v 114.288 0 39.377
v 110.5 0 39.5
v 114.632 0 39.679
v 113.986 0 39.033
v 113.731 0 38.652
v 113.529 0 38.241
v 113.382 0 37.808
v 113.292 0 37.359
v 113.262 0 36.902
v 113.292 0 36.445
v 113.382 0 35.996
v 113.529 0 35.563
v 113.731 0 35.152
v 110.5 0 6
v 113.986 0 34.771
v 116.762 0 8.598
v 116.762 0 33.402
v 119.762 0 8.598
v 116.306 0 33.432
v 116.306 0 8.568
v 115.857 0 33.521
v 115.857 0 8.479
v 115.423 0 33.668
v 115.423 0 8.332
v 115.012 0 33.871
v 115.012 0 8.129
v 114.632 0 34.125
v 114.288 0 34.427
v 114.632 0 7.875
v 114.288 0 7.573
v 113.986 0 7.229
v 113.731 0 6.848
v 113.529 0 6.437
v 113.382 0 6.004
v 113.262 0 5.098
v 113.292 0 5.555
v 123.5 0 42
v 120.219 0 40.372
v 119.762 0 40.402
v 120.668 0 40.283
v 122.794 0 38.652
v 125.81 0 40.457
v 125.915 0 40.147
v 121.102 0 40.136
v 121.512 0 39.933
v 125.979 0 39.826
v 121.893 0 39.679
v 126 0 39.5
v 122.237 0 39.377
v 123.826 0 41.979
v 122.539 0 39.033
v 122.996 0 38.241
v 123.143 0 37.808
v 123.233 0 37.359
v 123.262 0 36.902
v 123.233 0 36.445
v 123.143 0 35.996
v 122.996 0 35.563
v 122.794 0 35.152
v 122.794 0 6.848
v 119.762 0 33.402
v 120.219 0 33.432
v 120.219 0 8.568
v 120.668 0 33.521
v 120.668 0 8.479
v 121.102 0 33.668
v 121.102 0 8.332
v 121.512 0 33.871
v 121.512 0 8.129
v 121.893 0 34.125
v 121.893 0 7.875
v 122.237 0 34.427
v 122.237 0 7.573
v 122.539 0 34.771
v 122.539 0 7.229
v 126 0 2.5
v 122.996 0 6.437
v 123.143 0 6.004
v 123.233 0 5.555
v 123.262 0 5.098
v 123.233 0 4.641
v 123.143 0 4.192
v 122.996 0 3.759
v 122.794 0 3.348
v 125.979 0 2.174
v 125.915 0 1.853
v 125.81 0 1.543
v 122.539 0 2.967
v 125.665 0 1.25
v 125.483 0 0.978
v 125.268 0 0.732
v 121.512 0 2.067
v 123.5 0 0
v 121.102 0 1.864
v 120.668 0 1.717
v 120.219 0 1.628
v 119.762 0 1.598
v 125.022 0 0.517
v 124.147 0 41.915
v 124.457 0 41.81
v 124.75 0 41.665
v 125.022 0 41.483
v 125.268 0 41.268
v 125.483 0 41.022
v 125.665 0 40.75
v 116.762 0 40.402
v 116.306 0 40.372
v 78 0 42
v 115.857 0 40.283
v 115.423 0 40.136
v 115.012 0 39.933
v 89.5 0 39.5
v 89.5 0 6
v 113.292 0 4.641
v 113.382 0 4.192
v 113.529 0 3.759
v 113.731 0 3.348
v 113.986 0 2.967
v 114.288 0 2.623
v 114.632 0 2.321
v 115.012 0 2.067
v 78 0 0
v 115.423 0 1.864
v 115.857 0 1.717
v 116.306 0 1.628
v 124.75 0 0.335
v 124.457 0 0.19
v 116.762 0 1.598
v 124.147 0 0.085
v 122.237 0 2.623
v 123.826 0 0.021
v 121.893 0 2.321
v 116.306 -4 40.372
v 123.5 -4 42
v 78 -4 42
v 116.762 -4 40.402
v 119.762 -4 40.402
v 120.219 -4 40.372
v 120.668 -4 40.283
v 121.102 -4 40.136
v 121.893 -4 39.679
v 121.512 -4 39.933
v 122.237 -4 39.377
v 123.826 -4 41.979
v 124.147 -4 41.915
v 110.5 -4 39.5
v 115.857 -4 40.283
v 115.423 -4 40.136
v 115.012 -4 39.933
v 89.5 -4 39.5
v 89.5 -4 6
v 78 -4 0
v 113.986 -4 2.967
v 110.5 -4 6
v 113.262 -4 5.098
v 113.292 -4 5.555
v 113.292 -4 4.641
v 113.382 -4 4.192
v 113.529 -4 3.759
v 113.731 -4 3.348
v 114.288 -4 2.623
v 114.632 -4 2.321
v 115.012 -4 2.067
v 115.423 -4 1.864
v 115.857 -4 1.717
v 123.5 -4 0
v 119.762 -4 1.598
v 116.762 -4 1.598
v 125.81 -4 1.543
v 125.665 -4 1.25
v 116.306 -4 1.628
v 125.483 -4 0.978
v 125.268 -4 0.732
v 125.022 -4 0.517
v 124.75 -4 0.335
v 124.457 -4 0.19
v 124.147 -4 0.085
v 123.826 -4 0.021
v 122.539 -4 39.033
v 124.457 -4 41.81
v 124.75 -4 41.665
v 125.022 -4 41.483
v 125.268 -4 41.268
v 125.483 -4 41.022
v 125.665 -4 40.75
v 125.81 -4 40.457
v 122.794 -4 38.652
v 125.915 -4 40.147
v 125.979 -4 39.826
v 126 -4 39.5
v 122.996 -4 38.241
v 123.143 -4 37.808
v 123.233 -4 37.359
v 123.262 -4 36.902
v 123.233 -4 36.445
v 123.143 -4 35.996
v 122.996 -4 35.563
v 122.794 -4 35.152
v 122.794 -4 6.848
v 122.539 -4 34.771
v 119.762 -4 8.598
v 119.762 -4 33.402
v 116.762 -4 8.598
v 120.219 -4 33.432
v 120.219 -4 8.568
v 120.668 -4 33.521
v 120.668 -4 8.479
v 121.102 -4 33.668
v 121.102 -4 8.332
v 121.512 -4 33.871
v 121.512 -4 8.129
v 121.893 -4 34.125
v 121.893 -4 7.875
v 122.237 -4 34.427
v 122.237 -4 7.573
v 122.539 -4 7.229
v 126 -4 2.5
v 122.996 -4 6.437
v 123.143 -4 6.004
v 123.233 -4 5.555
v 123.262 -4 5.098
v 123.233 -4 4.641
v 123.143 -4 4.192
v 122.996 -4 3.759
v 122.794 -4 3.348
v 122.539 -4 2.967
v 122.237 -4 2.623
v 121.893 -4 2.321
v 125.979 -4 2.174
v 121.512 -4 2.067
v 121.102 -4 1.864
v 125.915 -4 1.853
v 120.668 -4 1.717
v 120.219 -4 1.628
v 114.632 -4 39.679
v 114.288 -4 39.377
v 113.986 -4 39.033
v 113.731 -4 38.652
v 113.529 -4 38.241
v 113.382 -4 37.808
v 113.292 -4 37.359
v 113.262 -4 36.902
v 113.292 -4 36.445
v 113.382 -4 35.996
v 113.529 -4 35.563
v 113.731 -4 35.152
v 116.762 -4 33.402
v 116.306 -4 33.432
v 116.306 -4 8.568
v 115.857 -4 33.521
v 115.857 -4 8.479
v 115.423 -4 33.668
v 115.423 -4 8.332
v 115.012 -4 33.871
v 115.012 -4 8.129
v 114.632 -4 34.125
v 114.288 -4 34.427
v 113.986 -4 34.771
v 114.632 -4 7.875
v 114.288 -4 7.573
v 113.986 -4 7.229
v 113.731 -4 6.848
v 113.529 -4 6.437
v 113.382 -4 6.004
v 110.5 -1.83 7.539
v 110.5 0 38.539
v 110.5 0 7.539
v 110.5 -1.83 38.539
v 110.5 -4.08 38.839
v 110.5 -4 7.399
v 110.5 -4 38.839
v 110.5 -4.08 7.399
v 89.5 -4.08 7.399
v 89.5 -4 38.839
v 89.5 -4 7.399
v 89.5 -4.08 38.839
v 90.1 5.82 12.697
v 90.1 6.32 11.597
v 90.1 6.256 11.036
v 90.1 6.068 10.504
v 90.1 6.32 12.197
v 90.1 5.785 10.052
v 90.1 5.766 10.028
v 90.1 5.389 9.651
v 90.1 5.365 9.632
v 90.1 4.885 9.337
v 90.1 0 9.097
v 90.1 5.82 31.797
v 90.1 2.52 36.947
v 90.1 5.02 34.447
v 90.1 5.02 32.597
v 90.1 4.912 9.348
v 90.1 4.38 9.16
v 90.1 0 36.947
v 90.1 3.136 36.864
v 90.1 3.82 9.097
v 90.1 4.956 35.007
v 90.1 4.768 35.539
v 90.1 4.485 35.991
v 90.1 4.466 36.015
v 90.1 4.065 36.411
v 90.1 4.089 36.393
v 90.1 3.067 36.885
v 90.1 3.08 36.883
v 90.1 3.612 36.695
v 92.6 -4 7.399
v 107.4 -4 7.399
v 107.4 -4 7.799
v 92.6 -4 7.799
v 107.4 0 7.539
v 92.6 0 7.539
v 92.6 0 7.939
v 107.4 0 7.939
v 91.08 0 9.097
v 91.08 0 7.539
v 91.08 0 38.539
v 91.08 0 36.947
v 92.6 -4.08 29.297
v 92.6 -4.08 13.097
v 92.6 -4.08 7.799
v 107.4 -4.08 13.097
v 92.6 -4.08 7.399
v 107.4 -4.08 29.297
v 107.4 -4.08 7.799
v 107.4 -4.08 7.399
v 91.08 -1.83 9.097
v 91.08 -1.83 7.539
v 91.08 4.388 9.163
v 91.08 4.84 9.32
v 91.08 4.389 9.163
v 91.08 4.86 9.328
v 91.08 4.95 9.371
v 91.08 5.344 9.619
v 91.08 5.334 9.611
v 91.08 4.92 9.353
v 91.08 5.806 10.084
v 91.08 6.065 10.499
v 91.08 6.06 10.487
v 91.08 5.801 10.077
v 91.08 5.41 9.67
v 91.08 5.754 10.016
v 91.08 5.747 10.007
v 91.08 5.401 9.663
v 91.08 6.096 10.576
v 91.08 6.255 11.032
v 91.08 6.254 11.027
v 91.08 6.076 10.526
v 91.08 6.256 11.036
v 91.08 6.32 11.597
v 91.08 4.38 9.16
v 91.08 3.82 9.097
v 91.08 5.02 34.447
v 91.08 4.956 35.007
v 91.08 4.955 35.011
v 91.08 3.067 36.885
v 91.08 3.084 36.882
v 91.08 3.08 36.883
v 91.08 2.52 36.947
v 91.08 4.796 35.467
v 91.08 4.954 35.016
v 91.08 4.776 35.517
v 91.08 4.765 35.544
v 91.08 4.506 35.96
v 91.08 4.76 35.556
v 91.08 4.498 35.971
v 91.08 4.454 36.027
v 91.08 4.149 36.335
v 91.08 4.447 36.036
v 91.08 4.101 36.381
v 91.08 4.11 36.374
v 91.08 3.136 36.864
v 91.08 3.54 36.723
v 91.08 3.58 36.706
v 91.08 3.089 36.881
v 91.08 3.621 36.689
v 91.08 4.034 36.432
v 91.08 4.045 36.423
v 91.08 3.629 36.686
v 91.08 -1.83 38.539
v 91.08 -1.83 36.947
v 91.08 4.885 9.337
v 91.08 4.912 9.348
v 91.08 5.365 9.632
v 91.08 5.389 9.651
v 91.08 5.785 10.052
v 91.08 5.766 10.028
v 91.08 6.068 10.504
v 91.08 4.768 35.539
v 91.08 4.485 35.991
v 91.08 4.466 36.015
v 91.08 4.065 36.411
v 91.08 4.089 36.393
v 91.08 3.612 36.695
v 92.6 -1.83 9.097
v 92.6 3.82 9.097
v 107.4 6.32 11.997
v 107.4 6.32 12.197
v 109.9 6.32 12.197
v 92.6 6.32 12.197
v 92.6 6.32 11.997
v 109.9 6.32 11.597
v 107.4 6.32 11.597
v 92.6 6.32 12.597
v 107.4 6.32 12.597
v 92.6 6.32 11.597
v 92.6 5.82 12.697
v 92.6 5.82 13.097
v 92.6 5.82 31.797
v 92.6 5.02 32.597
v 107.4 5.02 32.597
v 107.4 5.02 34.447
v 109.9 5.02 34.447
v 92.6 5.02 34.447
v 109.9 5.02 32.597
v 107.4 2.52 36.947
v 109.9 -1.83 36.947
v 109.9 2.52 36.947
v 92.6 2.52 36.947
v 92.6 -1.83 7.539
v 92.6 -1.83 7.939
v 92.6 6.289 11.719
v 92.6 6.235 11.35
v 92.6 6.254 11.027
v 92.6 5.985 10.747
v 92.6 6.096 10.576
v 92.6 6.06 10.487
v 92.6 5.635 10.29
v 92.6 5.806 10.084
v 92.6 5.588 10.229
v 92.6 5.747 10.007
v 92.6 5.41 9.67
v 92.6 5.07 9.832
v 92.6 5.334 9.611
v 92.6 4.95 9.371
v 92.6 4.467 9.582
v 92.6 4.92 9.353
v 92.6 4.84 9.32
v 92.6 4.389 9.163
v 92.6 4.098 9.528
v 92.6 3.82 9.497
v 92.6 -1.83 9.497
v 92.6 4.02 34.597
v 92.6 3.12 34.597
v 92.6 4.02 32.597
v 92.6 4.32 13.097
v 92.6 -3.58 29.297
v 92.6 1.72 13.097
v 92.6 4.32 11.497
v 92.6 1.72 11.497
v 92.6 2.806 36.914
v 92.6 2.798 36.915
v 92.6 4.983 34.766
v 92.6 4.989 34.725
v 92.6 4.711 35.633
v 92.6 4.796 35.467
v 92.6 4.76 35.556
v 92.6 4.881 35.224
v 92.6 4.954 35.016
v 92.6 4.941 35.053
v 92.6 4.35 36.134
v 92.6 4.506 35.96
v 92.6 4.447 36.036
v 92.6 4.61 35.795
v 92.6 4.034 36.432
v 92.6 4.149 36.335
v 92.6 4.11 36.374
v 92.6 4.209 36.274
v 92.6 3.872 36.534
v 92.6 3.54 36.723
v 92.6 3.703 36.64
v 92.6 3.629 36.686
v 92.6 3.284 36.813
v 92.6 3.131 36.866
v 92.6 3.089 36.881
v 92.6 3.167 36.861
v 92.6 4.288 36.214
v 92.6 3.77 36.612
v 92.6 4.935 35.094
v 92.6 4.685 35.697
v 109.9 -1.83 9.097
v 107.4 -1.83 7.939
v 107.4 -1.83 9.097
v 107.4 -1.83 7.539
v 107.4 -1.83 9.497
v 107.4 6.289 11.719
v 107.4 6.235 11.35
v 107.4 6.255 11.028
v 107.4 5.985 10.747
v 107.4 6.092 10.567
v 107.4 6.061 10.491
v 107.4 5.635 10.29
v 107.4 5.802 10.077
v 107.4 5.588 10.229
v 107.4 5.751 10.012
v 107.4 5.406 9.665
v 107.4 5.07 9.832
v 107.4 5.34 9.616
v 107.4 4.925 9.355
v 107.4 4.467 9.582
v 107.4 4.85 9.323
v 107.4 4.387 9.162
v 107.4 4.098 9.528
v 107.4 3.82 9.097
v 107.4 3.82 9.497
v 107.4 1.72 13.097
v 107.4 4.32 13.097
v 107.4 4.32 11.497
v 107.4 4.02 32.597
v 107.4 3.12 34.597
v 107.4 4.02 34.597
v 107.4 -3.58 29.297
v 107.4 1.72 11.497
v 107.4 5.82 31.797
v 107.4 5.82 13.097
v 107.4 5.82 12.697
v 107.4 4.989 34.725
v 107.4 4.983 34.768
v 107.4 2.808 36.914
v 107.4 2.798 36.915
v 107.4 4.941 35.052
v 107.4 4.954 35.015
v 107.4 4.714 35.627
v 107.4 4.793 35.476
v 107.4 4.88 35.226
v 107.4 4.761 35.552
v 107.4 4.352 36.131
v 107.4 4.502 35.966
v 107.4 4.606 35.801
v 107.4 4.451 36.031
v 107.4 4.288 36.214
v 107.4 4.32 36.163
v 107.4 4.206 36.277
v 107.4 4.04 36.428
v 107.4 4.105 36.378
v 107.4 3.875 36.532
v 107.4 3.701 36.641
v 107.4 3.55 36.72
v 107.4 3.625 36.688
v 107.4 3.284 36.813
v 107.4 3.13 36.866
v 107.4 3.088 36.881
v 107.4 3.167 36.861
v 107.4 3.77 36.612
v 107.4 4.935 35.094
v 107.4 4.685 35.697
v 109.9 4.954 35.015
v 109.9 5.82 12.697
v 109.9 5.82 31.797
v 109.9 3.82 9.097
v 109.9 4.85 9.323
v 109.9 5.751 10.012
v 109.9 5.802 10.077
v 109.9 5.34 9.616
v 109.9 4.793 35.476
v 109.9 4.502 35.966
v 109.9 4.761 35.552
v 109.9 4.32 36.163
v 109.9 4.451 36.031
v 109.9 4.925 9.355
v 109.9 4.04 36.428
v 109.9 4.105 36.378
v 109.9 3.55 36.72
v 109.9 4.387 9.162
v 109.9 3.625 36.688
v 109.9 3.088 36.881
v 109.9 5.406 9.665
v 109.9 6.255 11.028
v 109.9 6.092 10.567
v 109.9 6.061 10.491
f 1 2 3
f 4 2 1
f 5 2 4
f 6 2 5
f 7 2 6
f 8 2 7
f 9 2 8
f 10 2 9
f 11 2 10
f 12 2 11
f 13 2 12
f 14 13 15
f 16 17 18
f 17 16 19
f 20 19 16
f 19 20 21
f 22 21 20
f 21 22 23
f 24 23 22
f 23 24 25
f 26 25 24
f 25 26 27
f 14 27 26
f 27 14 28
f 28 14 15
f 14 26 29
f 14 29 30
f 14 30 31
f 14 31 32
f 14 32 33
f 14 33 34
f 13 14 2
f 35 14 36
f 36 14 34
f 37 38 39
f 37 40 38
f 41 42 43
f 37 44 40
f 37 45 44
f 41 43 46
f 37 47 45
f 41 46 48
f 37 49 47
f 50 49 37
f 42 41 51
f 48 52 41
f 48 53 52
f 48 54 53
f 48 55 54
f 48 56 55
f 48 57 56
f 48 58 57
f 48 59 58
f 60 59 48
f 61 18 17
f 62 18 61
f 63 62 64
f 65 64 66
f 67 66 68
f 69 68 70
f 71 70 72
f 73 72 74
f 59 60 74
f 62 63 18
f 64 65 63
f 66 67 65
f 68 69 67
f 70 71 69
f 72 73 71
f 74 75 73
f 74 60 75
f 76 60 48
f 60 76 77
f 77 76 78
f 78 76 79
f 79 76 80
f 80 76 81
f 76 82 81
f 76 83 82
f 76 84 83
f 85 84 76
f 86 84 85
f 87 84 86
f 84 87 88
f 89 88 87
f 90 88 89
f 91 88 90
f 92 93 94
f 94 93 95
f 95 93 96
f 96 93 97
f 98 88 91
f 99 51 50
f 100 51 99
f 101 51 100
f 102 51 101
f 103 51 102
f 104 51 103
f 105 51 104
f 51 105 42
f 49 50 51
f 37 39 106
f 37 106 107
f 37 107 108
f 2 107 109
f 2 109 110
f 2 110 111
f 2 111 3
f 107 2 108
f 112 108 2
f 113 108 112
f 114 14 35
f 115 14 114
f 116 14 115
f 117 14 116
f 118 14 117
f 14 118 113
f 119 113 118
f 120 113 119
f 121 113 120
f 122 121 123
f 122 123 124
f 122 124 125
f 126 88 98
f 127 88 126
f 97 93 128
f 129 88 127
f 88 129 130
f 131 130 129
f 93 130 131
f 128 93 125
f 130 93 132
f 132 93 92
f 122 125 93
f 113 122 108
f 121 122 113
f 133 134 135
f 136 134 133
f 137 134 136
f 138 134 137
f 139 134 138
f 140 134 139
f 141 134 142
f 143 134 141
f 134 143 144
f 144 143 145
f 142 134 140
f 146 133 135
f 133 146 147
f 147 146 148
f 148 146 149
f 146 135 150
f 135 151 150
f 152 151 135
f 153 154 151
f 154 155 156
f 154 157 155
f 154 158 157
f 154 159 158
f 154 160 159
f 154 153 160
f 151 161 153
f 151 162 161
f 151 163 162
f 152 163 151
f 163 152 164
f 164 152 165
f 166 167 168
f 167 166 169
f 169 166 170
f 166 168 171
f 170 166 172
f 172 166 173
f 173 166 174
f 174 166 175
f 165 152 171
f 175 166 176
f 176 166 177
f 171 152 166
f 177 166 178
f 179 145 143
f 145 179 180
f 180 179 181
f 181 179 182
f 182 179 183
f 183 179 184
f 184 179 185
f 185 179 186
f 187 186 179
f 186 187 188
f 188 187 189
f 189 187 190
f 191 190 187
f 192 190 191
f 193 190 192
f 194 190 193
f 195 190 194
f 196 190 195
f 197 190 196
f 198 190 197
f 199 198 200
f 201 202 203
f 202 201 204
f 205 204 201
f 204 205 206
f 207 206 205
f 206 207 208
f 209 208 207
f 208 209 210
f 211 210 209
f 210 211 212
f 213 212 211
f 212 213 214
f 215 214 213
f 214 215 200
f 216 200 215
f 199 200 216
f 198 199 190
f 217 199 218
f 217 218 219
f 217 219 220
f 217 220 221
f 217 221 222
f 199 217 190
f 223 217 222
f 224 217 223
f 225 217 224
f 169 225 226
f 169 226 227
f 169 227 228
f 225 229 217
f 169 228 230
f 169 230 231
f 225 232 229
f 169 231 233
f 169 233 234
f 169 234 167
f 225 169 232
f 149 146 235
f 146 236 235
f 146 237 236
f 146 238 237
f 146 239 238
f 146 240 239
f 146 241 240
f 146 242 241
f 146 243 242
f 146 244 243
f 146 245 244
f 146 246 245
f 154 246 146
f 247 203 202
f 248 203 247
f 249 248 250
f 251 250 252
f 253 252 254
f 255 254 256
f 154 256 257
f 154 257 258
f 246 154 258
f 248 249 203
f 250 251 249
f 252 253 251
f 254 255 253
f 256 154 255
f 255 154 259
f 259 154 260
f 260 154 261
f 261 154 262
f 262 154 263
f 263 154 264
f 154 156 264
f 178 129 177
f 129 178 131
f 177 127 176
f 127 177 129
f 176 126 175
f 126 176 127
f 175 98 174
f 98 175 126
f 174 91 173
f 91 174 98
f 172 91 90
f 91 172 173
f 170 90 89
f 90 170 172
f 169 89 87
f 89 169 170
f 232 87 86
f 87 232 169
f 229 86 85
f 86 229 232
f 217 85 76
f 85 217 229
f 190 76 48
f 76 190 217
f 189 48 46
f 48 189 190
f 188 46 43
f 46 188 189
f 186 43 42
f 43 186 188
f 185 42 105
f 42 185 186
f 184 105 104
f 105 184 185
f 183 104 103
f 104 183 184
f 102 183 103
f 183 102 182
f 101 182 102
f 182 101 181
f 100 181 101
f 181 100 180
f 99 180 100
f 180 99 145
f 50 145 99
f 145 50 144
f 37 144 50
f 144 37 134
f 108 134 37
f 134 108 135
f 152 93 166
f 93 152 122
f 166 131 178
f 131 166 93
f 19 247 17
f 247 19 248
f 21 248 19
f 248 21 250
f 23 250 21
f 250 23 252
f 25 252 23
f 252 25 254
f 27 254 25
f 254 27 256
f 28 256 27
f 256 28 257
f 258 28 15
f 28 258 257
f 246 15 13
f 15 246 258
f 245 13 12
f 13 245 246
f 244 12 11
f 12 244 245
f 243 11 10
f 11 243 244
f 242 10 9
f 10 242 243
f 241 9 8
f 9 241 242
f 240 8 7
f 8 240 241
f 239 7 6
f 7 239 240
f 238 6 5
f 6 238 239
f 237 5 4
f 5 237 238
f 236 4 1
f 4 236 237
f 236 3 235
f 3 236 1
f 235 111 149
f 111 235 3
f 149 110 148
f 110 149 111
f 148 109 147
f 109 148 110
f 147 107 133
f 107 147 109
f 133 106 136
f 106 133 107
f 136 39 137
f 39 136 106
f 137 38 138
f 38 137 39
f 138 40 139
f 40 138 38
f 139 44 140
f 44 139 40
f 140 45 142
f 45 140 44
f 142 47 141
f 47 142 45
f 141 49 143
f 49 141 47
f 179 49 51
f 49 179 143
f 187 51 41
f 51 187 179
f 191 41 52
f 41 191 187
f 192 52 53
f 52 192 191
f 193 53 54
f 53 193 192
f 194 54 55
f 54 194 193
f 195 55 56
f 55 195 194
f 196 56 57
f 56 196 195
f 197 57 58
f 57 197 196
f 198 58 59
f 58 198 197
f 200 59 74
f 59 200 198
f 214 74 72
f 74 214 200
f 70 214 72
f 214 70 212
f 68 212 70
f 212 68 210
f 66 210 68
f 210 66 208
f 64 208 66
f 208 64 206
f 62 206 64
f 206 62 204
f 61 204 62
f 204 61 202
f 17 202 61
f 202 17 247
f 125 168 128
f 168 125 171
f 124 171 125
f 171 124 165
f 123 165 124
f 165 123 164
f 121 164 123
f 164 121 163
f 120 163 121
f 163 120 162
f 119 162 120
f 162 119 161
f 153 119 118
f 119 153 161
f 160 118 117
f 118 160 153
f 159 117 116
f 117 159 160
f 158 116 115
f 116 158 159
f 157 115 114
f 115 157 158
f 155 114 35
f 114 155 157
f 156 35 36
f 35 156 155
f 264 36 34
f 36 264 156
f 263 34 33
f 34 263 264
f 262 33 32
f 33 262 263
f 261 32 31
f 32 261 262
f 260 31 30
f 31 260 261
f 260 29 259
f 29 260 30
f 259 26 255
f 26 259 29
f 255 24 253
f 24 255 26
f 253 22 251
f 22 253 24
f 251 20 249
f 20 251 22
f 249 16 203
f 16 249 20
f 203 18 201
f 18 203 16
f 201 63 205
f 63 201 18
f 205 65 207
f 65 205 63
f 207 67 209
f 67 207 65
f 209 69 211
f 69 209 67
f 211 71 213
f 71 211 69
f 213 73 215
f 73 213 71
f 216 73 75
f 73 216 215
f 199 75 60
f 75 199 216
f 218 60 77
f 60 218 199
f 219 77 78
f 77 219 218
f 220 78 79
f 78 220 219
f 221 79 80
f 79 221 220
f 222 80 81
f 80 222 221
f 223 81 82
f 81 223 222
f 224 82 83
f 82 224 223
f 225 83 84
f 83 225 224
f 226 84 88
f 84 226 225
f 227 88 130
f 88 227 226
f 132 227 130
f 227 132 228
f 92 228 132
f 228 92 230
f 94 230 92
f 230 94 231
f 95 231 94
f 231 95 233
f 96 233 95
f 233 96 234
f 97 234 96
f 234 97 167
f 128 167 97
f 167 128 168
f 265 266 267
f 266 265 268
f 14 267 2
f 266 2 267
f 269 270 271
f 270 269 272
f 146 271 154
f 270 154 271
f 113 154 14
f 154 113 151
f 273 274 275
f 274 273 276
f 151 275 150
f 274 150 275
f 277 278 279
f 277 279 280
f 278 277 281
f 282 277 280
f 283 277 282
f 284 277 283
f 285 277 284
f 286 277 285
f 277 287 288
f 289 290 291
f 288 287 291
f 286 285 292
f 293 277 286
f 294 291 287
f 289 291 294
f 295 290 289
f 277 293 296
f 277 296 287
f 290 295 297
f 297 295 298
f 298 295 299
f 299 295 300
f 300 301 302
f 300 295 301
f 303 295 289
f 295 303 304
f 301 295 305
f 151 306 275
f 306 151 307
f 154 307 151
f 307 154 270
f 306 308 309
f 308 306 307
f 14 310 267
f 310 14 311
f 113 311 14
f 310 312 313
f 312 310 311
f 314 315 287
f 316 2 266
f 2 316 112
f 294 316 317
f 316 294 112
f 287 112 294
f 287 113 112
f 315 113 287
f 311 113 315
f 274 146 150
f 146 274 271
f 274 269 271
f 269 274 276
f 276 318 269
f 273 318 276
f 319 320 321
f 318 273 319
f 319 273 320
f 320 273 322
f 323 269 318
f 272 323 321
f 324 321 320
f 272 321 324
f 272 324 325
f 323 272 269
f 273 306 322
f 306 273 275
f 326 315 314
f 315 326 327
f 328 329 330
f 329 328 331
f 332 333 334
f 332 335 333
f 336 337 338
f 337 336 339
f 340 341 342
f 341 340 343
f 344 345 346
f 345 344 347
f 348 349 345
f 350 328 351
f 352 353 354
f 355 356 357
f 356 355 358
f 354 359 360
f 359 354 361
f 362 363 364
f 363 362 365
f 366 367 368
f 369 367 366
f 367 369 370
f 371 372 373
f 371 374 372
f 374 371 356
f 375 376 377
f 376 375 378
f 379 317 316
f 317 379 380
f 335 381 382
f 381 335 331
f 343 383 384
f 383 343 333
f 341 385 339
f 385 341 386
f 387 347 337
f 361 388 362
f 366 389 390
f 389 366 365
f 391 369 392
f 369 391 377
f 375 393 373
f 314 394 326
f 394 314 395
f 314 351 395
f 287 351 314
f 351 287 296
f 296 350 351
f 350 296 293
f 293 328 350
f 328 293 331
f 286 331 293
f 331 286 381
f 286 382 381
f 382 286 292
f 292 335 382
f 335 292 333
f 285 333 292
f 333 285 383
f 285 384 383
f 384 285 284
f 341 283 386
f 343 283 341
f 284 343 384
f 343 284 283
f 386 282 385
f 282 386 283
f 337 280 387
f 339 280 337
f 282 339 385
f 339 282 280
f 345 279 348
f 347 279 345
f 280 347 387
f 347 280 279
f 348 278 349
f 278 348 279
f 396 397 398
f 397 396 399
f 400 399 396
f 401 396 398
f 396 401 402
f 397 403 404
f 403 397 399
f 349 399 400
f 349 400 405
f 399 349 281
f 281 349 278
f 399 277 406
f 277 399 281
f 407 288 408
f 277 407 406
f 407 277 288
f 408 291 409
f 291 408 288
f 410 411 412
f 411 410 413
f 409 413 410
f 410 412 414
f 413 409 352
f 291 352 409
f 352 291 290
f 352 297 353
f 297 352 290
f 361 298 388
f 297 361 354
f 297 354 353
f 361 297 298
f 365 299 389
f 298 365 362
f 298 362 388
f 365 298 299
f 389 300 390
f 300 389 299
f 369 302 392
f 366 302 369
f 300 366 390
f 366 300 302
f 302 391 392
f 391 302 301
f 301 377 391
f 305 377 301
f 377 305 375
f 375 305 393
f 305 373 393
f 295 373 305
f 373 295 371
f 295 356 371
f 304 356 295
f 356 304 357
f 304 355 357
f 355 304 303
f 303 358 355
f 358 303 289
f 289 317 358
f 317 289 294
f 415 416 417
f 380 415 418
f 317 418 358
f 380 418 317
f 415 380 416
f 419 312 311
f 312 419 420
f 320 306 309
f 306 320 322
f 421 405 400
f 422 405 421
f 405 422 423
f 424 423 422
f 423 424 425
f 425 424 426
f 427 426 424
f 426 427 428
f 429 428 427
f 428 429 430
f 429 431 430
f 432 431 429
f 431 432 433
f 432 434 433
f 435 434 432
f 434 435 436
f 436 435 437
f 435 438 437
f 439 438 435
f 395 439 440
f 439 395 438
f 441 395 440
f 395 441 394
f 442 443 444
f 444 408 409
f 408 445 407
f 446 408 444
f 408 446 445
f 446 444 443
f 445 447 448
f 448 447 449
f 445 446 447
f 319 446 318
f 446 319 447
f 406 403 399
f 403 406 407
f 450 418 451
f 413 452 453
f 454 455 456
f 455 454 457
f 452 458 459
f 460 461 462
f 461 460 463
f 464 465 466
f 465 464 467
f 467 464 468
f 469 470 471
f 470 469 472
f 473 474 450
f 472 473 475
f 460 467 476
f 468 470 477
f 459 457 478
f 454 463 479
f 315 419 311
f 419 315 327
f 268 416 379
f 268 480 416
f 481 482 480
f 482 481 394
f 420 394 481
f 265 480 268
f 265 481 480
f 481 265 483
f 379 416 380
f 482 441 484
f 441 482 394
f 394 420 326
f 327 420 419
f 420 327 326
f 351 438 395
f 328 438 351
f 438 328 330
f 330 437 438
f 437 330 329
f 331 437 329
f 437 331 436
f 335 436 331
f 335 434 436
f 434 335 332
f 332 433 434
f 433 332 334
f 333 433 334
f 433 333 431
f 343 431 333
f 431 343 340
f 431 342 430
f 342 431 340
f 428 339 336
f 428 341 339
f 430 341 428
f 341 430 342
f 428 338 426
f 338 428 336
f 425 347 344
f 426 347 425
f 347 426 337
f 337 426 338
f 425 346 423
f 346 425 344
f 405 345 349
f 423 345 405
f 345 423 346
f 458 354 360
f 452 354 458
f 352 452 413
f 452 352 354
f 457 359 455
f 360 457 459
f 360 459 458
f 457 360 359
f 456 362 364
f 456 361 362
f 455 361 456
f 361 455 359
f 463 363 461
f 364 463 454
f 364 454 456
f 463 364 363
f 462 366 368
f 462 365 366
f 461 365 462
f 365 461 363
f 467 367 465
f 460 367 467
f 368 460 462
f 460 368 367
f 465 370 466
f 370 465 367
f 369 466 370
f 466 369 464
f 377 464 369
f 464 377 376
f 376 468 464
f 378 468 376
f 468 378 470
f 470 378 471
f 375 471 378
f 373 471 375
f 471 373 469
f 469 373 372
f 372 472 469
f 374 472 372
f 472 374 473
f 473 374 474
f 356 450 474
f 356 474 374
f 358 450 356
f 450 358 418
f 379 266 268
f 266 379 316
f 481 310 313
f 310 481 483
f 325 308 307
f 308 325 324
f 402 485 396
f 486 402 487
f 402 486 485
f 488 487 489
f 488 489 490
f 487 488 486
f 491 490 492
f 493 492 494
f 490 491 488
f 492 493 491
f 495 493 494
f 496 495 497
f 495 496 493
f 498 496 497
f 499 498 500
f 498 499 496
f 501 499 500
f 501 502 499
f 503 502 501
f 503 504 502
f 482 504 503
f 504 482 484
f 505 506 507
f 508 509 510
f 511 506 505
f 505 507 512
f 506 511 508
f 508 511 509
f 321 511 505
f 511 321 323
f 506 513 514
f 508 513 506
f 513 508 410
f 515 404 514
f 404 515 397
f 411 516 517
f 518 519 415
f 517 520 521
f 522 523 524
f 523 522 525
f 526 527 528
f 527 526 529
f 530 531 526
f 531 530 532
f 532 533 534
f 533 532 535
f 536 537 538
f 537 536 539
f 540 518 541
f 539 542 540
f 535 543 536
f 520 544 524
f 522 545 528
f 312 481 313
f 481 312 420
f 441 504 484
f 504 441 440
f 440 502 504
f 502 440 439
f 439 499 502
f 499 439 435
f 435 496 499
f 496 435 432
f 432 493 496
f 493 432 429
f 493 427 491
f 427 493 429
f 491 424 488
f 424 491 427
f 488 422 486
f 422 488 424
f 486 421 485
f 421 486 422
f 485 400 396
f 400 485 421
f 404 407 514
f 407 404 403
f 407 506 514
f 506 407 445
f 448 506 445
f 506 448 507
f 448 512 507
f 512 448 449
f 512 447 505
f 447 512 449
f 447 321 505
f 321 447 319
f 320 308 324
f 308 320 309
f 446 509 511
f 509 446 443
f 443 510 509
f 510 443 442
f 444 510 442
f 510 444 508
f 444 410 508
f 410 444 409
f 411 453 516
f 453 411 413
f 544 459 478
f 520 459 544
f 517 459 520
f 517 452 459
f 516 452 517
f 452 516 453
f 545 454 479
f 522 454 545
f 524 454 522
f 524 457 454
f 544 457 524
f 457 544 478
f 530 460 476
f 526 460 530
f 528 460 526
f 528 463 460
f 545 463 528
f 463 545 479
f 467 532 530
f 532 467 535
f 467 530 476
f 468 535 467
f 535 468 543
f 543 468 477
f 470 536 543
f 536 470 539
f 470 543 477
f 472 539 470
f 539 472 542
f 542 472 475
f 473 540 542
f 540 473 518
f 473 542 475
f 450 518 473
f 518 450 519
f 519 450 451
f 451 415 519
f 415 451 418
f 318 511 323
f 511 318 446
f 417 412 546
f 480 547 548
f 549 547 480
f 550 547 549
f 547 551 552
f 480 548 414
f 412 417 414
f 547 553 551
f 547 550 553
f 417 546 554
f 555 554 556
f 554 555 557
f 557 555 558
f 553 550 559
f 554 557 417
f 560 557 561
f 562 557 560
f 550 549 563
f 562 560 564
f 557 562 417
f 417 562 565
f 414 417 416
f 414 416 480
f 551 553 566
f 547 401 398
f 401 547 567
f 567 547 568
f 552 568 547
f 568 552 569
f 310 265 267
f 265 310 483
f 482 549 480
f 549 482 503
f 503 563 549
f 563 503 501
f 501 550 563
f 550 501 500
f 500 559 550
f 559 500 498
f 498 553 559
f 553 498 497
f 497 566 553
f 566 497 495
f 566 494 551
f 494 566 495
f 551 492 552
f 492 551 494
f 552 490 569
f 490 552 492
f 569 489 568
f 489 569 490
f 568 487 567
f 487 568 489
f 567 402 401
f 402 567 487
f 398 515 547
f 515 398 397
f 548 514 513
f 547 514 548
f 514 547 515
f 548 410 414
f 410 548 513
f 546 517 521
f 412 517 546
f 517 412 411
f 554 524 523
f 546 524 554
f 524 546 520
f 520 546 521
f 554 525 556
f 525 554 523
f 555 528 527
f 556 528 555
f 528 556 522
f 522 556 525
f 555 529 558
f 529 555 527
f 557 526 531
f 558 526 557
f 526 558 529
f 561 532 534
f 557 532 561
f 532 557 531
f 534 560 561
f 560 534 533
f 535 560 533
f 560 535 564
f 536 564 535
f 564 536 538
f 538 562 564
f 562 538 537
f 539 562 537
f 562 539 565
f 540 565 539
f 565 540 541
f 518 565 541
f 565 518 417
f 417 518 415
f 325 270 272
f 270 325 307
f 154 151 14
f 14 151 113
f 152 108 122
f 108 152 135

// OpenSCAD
// Lab Rax generic equipment tray + faceplate (wizard template).
// Faceplate derived from the Pi4 baseline; rack holes follow the four-corner layout of the user-supplied
// 1U blank plate (faceplate_mounting.json): EVERY rack unit gets 4 holes, never a single centre pair.
// The wizard appends override assignments at the end of this file.
// PROPOSED, UNVALIDATED: printed fit, strength and rack clearance are UNKNOWN.
$fn=48;
part="assembly";            // assembly, faceplate, tray, combined, rear_bracket
// Device envelope (mm). Origin of hole coordinates = device front-left corner, seen from above.
dev_w=85; dev_d=56; dev_h=20;
holes=[];                   // [[x,y],...] mounting hole centres
hole_d=2.7;                 // device mounting hole diameter
device_mount="inserts";     // inserts, pegs, clips, straps
standoff=6;                 // device lift above tray floor
insert_pilot=3.2;           // pilot for heat-set insert (inserts mode)
board_t=1.6;                // board/flange thickness (pegs, clips)
joint="screw";              // screw, single ("snap" retired 2026-10-19: too brittle; kept as history)
u=1;                        // faceplate height in rack units
keystones=[];               // [x,...] keystone centres on faceplate (X=0 centre)
// Keystone v2 (2026-10-19, now the fallback; see ks_style): re-modelled from measurements of Brian's reference keystone frame
// (14.5 x 16 opening was too narrow when printed). Opening 14.8 x 16.6 through the plate, plus a rear collar
// 19.8 x 27.85 reaching 9.2 mm behind the front face (bottom lip to 10.4) that carries the latch ramp and catches.
ks_w=14.8; ks_h=16.6;       // front opening
ks_ow=19.8; ks_ob=11.9; ks_ot=15.95; ks_od=9.2; ks_lip=10.4;  // collar width, below/above opening centre, depth
ports=[];                   // [[x,z,w,h,r],...] faceplate cut-outs, z from plate bottom, r=corner radius
front_gap=12;               // device front to faceplate rear face
margin=8;                   // tray border around device
rear_support=false;         // heavy/deep equipment: tray runs to the rear posts and screws to a rear bracket
coupon=[];                  // test coupon: [x0,x1,ymax] keeps only that slice of the part

// 4 mm plate (owner default 2026-10-18). Corner radius is limited by the four-corner holes:
// the reference holes sit 1.6 mm from the top/bottom edge, so larger corners would cut into them.
plate_w=252; plate_t=4; plate_r=2.5; plate_h=u*44.45-2.45;
hole_x=118.2625; hole_dz=15.902;   // each U: holes at its centre ±hole_dz (5.098 / 36.902 on a 1U plate)
rack_depth=240;             // Lab Rax frame depth (front of front posts to back of rear posts)
nudge=0;                    // render-repair only: tiny size offset applied when OpenSCAD 2021 emits a sliver
tray_t=3; tray_z=7;
tray_w=dev_w+2*margin; tray_d=rear_support?rack_depth:dev_d+front_gap+margin;
tray_x=-tray_w/2; tray_y=0;
dev_x=-dev_w/2; dev_y=front_gap; floor_top=tray_z+tray_t;
jx=min(40,tray_w/2-12); joint_x=[-jx,jx];
tongue_w=12; tongue_depth=7; tongue_h=3; tongue_z=tray_z+3.5;
slot_clear=0.3; boss_d=9; m3_clear=3.4; joint_pilot=4.0;  // 4.0 = the printed, well-fitting Pi4 trial

module capsule2d(len=10,diam=7){hull(){translate([-(len-diam)/2,0])circle(d=diam);translate([(len-diam)/2,0])circle(d=diam);}}
module rrect(w,h,r){rr=min(r,w/2-0.01,h/2-0.01);if(rr<=0)square([w,h],center=true);else offset(r=rr)square([w-2*rr,h-2*rr],center=true);}
// Mirror front-of-tray features to the rear (about the rack's mid-depth).
module to_rear(){translate([0,rack_depth/2,0])mirror([0,1,0])translate([0,-rack_depth/2,0])children();}

// Faceplate outline seen from the front: 2D X = rack X, 2D Y = height Z.
// rear=true cuts the larger keystone pocket; plain=true leaves out keystones/ports (rear bracket).
module plate2d(rear=false,plain=false){
 difference(){
  hull()for(sx=[-1,1],sz=[-1,1])translate([sx*(plate_w/2-plate_r),plate_h/2+sz*(plate_h/2-plate_r)])circle(r=plate_r+nudge);
  for(i=[0:u-1],dz=[-hole_dz,hole_dz],x=[-hole_x,hole_x])translate([x,i*44.45+21+dz])capsule2d();
  if(!plain){
   for(p=ports)translate([p[0],p[1]])rrect(p[2],p[3],p[4]);
  }
 }
}
// Plate between y=y0 (front) and y0+t, built from the 2D outline (cleaner meshes than 3D cuts in OpenSCAD 2021).
module plate_layer(y0,t,rear=false,plain=false){translate([0,y0+t,0])rotate([90,0,0])linear_extrude(height=t)plate2d(rear,plain);}

module plate_joint_add(){
 if(joint=="screw"){
  for(x=joint_x)translate([x-tongue_w/2,0,tongue_z])cube([tongue_w,tongue_depth,tongue_h]);
  for(x=joint_x)translate([x,0,tray_z+14])rotate([-90,0,0])cylinder(d=boss_d,h=8);
 }
 if(joint=="snap") for(x=joint_x){
  // Cantilever arm under the tray floor; barb snaps up into a floor window.
  translate([x-4,0,tray_z-2])cube([8,16,2]);
  // Barb v2: square catch face toward the plate, ramp falling toward the rear so the tray, slid in
  // from the rear, cams the arm down until its window drops over the barb.
  translate([x-4,12,tray_z])hull(){cube([8,0.6,1.2]);cube([8,2.4,0.01]);}
 }
}
// Keystone collar behind the plate, and the jack-shaped cut through plate + collar.
// Profile in (d = depth behind front face, z from opening centre); X width is ks_w throughout.
module ks_collar(){for(x=keystones)translate([x-ks_ow/2,-plate_t,plate_h/2]){
 translate([0,0,-ks_ob])cube([ks_ow,ks_od,ks_ob+ks_ot]);
 translate([0,0,-ks_ob])cube([ks_ow,ks_lip,ks_ob-ks_h/2]);
}}
module ks_cut(){for(x=keystones)translate([x-ks_w/2,-plate_t,plate_h/2])rotate([90,0,90])linear_extrude(height=ks_w)
 polygon([[-1,-ks_h/2],[5.8,-ks_h/2],[5.8,-9.9],[9.2,-9.9],[9.2,-ks_h/2],[11,-ks_h/2],[11,11.6],[8.2,11.6],
          [8.2,ks_ot+1],[7.2,ks_ot+1],[7.2,13.6],[0.6,ks_h/2],[-1,ks_h/2]]);}
// Golden keystone (Brian, 2026-10-19): exact cross-sections of the keystone on Brian's SG108 faceplate, which fits
// perfectly in practice. Source: "10 inch shelf TP-Link SG108 Plus Keystone" by Goul (MakerWorld remix, BY-NC-SA),
// local/personal use only, never redistributed. Each band: [X from opening centre, width, polygons in source (Y, Z)]
// with source Y running down the plate (opening centre Y=25.09) and Z = depth (keystone face 0, plate back 4.08).
// The block replaces the plate within 21 x 33.5 mm around each keystone; front face sits 0.08 proud like the source.
ks_style="golden";          // golden (SG108 copy) or v2 (own measured rebuild, kept as fallback)
// Brian, 2026-10-19: the golden v3 print fit left/right well but had ~0.4 mm play up/down. ks_tight moves the
// bottom (hook-side) edge of the opening, its hook groove and lip up by this much; the latch side is unchanged.
ks_tight=0.4;
KS_GOLD=[
  [-10.50,0.60,[[[45.500,4.080],[45.500,0.080],[38.691,0.080],[38.691,0.000],[7.251,0.000],[7.251,0.080],[1.000,0.080],[1.000,4.080],[1.071,4.080]]]],
  [-9.90,0.98,[[[9.143,4.080],[9.143,6.600],[9.205,7.147],[9.207,7.160],[9.226,7.216],[9.395,7.692],[9.679,8.145],[9.697,8.169],[10.075,8.546],[10.099,8.565],[10.551,8.848],[11.083,9.036],[11.643,9.100],[13.493,9.100],[14.293,9.900],[33.393,9.900],[33.893,10.400],[34.493,10.400],[35.054,10.336],[35.586,10.148],[36.038,9.865],[36.062,9.846],[36.439,9.469],[36.458,9.445],[36.742,8.992],[36.753,8.965],[36.930,8.460],[36.993,7.900],[36.993,4.080],[45.500,4.080],[45.500,0.080],[38.691,0.080],[38.691,0.000],[7.251,0.000],[7.251,0.080],[1.000,0.080],[1.000,4.080],[1.014,4.080]]]],
  [-8.92,1.52,[[[7.551,4.080],[7.551,2.250],[9.143,2.250],[9.143,6.600],[9.209,7.169],[9.367,7.620],[9.404,7.709],[9.658,8.114],[9.716,8.190],[9.755,8.229],[10.054,8.527],[10.130,8.586],[10.534,8.840],[10.623,8.876],[11.074,9.034],[11.643,9.100],[13.493,9.100],[14.293,9.900],[33.393,9.900],[33.893,10.400],[34.493,10.400],[35.063,10.334],[35.514,10.176],[35.603,10.140],[36.006,9.886],[36.083,9.827],[36.420,9.490],[36.479,9.414],[36.719,9.030],[36.737,9.000],[36.770,8.920],[36.927,8.469],[36.993,7.900],[36.993,2.250],[38.551,2.250],[38.551,4.080],[45.500,4.080],[45.500,0.080],[38.691,0.080],[38.691,0.000],[7.251,0.000],[7.251,0.080],[1.000,0.080],[1.000,4.080],[1.044,4.080]]]],
  [-7.40,14.80,[[[7.551,4.080],[7.551,2.250],[9.143,2.250],[9.143,6.600],[9.175,6.878],[9.229,7.247],[9.478,7.850],[9.876,8.368],[10.393,8.765],[10.996,9.015],[11.365,9.069],[11.643,9.100],[13.493,9.100],[13.493,8.100],[11.493,8.100],[11.493,7.200],[16.793,0.500],[16.793,0.000],[7.251,0.000],[7.251,0.080],[1.000,0.080],[1.000,4.080],[1.025,4.080]],[[45.500,4.080],[45.500,0.080],[38.691,0.080],[38.691,0.000],[33.393,0.000],[33.393,5.800],[34.993,5.800],[34.993,8.400],[33.393,8.400],[33.393,9.900],[33.893,10.400],[34.493,10.400],[34.771,10.369],[35.140,10.315],[35.743,10.065],[36.200,9.715],[36.261,9.668],[36.658,9.150],[36.908,8.547],[36.962,8.178],[36.993,7.900],[36.993,2.250],[38.551,2.250],[38.551,4.080],[42.555,4.080]]]],
  [7.40,2.50,[[[45.500,4.080],[45.500,0.080],[38.691,0.080],[38.691,0.000],[7.251,0.000],[7.251,0.080],[1.000,0.080],[1.000,4.080],[7.551,4.080],[7.551,2.250],[9.143,2.250],[9.143,6.600],[9.209,7.168],[9.370,7.630],[9.402,7.705],[9.662,8.120],[9.712,8.185],[9.927,8.400],[10.059,8.531],[10.124,8.582],[10.538,8.841],[10.614,8.873],[11.075,9.034],[11.643,9.100],[13.493,9.100],[14.293,9.900],[33.393,9.900],[33.893,10.400],[34.493,10.400],[35.062,10.335],[35.523,10.172],[35.599,10.141],[36.013,9.882],[36.078,9.831],[36.425,9.486],[36.474,9.420],[36.735,9.005],[36.767,8.930],[36.928,8.467],[36.993,7.900],[36.993,2.250],[38.551,2.250],[38.551,4.080],[42.599,4.080]]]],
  [9.90,0.60,[[[45.500,4.080],[45.500,0.080],[38.691,0.080],[38.691,0.000],[7.251,0.000],[7.251,0.080],[1.000,0.080],[1.000,4.080],[7.551,4.080],[7.551,2.250],[38.551,2.250],[38.551,4.080],[42.635,4.080]]]]
];
module ks_golden(){for(x=keystones)translate([x,0,plate_h/2])multmatrix([[1,0,0,0],[0,0,1,-4.08],[0,-1,0,25.09],[0,0,0,1]])
 intersection(){
  union()for(b=KS_GOLD)translate([b[0],0,0])rotate([90,0,90])linear_extrude(height=b[1])for(pg=b[2])
   translate([b[1]>10&&min([for(q=pg)q[0]])>30?-ks_tight:0,0])polygon(pg);  // opening band, hook side
  translate([-10.5,25.09-18.5,-0.01])cube([21,33.5,10.42]);
 }}
module ks_box_cut(){for(x=keystones)translate([x-10.5,-plate_t-0.01,plate_h/2-15])cube([21,plate_t+0.02,33.5]);}
module plate_joint_cut(){if(joint=="screw")for(x=joint_x)translate([x,-0.1,tray_z+14])rotate([-90,0,0])cylinder(d=joint_pilot,h=8.2);}

module faceplate(){
 union(){
  difference(){
   union(){
    plate_layer(-plate_t,plate_t);
    if(ks_style=="v2")ks_collar();
    plate_joint_add();
   }
   plate_joint_cut();
   if(ks_style=="v2")ks_cut(); else ks_box_cut();
  }
  if(ks_style!="v2")ks_golden();
 }
}
// Plain plate on the rear posts (mirror of the faceplate, no openings) that the tray's rear end screws/snaps to.
module rear_bracket(){to_rear()difference(){union(){plate_layer(-plate_t,plate_t,false,true);plate_joint_add();}plate_joint_cut();}}

module device_features_add(){
 if(device_mount=="inserts")for(h=holes)translate([dev_x+h[0],dev_y+h[1],floor_top])cylinder(d=max(insert_pilot+3.5,7),h=standoff);
 if(device_mount=="pegs")for(h=holes)translate([dev_x+h[0],dev_y+h[1],floor_top]){
  cylinder(d=hole_d+3,h=standoff);
  translate([0,0,standoff])cylinder(d=hole_d-0.3,h=board_t+0.8);
  translate([0,0,standoff+board_t+0.8])cylinder(d1=hole_d-0.3,d2=hole_d-1,h=0.8);
 }
 if(device_mount=="clips"){
  // Support ledges at the four corners plus a flexing clip on each side.
  for(x=[dev_x-1,dev_x+dev_w-5],y=[dev_y-1,dev_y+dev_d-5])translate([x,y,floor_top])cube([6,6,standoff]);
  for(s=[-1,1])translate([s>0?dev_x+dev_w+0.2:dev_x-2.2,dev_y+dev_d/2-5,floor_top]){
   cube([2,10,standoff+board_t+2.5]);
   translate([s>0?-1.2:2,0,standoff+board_t+0.2])hull(){cube([1.2,10,1.6]);translate([s>0?1.2:0,0,1.6])cube([0.01,10,0.6]);}
  }
 }
}
module device_features_cut(){
 if(device_mount=="inserts")for(h=holes)translate([dev_x+h[0],dev_y+h[1],floor_top+0.01])cylinder(d=insert_pilot,h=standoff+0.1);
 if(device_mount=="straps")for(x=[dev_x-5.5,dev_x+dev_w+2.5],y=[dev_y+dev_d*0.25,dev_y+dev_d*0.75])
  translate([x,y-6,tray_z-0.1])cube([3,12,tray_t+0.2]);
}

module tray_joint_add(){
 if(joint=="screw"){
  for(x=joint_x) translate([x-9,0,tray_z+tray_t])cube([18,8,5]);
  for(x=joint_x)translate([x-7,8.3,tray_z+3])cube([14,3,19]);
  for(x=joint_x) for(side=[-1,1]) translate([x+side*6-1,0,0])
    hull(){translate([0,9,tray_z+2.7])cube([2,2,0.5]);
           translate([0,9,tray_z+8])cube([2,2,0.5]);
           translate([0,20,tray_z+2.7])cube([2,2,0.5]);}
 }
}
module tray_joint_cut(){
 if(joint=="screw"){
  for(x=joint_x)translate([x-(tongue_w+slot_clear)/2,-0.1,tongue_z-slot_clear/2])cube([tongue_w+slot_clear,tongue_depth+slot_clear,tongue_h+slot_clear]);
  for(x=joint_x)translate([x,11.4,tray_z+14])rotate([90,0,0])cylinder(d=m3_clear,h=12);
 }
 if(joint=="snap")for(x=joint_x)translate([x-4.3,11.6,tray_z-0.1])cube([8.6,3.2,tray_t+0.2]);
}

module tray(){
 difference(){
  union(){
   translate([tray_x,tray_y,tray_z])cube([tray_w,tray_d,tray_t]);
   tray_joint_add();
   if(rear_support)to_rear()tray_joint_add();
   device_features_add();
  }
  tray_joint_cut();
  if(rear_support)to_rear()tray_joint_cut();
  device_features_cut();
 }
}

module clip_coupon(){if(len(coupon)==3)intersection(){children();translate([coupon[0],-50,-50])cube([coupon[1]-coupon[0],coupon[2]+50,400]);}else children();}

clip_coupon(){
 if(part=="faceplate")faceplate();
 else if(part=="tray")tray();
 else if(part=="rear_bracket")rear_bracket();
 else if(part=="combined")union(){faceplate();translate([tray_x,-0.01,tray_z])cube([tray_w,0.02+0.01,tray_t]);tray();if(rear_support)rear_bracket();}
 else {color("steelblue")faceplate();color("silver")tray();if(rear_support)color("steelblue")rear_bracket();
  %translate([dev_x,dev_y,floor_top+(device_mount=="inserts"||device_mount=="pegs"||device_mount=="clips"?standoff:0)])cube([dev_w,dev_d,dev_h]);}
}

// ---- wizard overrides: 1_Keystone_and_corner_holes
dev_w=85.0;
dev_d=56.0;
dev_h=20.0;
hole_d=2.7;
standoff=6.0;
insert_pilot=3.2;
board_t=1.6;
u=1;
holes=[[3.5, 3.5], [61.5, 3.5], [3.5, 52.5], [61.5, 52.5]];
keystones=[100.0];
device_mount="inserts";
joint="screw";
rear_support=false;
coupon=[78.0, 127.0, 11.0];
ports=[];
